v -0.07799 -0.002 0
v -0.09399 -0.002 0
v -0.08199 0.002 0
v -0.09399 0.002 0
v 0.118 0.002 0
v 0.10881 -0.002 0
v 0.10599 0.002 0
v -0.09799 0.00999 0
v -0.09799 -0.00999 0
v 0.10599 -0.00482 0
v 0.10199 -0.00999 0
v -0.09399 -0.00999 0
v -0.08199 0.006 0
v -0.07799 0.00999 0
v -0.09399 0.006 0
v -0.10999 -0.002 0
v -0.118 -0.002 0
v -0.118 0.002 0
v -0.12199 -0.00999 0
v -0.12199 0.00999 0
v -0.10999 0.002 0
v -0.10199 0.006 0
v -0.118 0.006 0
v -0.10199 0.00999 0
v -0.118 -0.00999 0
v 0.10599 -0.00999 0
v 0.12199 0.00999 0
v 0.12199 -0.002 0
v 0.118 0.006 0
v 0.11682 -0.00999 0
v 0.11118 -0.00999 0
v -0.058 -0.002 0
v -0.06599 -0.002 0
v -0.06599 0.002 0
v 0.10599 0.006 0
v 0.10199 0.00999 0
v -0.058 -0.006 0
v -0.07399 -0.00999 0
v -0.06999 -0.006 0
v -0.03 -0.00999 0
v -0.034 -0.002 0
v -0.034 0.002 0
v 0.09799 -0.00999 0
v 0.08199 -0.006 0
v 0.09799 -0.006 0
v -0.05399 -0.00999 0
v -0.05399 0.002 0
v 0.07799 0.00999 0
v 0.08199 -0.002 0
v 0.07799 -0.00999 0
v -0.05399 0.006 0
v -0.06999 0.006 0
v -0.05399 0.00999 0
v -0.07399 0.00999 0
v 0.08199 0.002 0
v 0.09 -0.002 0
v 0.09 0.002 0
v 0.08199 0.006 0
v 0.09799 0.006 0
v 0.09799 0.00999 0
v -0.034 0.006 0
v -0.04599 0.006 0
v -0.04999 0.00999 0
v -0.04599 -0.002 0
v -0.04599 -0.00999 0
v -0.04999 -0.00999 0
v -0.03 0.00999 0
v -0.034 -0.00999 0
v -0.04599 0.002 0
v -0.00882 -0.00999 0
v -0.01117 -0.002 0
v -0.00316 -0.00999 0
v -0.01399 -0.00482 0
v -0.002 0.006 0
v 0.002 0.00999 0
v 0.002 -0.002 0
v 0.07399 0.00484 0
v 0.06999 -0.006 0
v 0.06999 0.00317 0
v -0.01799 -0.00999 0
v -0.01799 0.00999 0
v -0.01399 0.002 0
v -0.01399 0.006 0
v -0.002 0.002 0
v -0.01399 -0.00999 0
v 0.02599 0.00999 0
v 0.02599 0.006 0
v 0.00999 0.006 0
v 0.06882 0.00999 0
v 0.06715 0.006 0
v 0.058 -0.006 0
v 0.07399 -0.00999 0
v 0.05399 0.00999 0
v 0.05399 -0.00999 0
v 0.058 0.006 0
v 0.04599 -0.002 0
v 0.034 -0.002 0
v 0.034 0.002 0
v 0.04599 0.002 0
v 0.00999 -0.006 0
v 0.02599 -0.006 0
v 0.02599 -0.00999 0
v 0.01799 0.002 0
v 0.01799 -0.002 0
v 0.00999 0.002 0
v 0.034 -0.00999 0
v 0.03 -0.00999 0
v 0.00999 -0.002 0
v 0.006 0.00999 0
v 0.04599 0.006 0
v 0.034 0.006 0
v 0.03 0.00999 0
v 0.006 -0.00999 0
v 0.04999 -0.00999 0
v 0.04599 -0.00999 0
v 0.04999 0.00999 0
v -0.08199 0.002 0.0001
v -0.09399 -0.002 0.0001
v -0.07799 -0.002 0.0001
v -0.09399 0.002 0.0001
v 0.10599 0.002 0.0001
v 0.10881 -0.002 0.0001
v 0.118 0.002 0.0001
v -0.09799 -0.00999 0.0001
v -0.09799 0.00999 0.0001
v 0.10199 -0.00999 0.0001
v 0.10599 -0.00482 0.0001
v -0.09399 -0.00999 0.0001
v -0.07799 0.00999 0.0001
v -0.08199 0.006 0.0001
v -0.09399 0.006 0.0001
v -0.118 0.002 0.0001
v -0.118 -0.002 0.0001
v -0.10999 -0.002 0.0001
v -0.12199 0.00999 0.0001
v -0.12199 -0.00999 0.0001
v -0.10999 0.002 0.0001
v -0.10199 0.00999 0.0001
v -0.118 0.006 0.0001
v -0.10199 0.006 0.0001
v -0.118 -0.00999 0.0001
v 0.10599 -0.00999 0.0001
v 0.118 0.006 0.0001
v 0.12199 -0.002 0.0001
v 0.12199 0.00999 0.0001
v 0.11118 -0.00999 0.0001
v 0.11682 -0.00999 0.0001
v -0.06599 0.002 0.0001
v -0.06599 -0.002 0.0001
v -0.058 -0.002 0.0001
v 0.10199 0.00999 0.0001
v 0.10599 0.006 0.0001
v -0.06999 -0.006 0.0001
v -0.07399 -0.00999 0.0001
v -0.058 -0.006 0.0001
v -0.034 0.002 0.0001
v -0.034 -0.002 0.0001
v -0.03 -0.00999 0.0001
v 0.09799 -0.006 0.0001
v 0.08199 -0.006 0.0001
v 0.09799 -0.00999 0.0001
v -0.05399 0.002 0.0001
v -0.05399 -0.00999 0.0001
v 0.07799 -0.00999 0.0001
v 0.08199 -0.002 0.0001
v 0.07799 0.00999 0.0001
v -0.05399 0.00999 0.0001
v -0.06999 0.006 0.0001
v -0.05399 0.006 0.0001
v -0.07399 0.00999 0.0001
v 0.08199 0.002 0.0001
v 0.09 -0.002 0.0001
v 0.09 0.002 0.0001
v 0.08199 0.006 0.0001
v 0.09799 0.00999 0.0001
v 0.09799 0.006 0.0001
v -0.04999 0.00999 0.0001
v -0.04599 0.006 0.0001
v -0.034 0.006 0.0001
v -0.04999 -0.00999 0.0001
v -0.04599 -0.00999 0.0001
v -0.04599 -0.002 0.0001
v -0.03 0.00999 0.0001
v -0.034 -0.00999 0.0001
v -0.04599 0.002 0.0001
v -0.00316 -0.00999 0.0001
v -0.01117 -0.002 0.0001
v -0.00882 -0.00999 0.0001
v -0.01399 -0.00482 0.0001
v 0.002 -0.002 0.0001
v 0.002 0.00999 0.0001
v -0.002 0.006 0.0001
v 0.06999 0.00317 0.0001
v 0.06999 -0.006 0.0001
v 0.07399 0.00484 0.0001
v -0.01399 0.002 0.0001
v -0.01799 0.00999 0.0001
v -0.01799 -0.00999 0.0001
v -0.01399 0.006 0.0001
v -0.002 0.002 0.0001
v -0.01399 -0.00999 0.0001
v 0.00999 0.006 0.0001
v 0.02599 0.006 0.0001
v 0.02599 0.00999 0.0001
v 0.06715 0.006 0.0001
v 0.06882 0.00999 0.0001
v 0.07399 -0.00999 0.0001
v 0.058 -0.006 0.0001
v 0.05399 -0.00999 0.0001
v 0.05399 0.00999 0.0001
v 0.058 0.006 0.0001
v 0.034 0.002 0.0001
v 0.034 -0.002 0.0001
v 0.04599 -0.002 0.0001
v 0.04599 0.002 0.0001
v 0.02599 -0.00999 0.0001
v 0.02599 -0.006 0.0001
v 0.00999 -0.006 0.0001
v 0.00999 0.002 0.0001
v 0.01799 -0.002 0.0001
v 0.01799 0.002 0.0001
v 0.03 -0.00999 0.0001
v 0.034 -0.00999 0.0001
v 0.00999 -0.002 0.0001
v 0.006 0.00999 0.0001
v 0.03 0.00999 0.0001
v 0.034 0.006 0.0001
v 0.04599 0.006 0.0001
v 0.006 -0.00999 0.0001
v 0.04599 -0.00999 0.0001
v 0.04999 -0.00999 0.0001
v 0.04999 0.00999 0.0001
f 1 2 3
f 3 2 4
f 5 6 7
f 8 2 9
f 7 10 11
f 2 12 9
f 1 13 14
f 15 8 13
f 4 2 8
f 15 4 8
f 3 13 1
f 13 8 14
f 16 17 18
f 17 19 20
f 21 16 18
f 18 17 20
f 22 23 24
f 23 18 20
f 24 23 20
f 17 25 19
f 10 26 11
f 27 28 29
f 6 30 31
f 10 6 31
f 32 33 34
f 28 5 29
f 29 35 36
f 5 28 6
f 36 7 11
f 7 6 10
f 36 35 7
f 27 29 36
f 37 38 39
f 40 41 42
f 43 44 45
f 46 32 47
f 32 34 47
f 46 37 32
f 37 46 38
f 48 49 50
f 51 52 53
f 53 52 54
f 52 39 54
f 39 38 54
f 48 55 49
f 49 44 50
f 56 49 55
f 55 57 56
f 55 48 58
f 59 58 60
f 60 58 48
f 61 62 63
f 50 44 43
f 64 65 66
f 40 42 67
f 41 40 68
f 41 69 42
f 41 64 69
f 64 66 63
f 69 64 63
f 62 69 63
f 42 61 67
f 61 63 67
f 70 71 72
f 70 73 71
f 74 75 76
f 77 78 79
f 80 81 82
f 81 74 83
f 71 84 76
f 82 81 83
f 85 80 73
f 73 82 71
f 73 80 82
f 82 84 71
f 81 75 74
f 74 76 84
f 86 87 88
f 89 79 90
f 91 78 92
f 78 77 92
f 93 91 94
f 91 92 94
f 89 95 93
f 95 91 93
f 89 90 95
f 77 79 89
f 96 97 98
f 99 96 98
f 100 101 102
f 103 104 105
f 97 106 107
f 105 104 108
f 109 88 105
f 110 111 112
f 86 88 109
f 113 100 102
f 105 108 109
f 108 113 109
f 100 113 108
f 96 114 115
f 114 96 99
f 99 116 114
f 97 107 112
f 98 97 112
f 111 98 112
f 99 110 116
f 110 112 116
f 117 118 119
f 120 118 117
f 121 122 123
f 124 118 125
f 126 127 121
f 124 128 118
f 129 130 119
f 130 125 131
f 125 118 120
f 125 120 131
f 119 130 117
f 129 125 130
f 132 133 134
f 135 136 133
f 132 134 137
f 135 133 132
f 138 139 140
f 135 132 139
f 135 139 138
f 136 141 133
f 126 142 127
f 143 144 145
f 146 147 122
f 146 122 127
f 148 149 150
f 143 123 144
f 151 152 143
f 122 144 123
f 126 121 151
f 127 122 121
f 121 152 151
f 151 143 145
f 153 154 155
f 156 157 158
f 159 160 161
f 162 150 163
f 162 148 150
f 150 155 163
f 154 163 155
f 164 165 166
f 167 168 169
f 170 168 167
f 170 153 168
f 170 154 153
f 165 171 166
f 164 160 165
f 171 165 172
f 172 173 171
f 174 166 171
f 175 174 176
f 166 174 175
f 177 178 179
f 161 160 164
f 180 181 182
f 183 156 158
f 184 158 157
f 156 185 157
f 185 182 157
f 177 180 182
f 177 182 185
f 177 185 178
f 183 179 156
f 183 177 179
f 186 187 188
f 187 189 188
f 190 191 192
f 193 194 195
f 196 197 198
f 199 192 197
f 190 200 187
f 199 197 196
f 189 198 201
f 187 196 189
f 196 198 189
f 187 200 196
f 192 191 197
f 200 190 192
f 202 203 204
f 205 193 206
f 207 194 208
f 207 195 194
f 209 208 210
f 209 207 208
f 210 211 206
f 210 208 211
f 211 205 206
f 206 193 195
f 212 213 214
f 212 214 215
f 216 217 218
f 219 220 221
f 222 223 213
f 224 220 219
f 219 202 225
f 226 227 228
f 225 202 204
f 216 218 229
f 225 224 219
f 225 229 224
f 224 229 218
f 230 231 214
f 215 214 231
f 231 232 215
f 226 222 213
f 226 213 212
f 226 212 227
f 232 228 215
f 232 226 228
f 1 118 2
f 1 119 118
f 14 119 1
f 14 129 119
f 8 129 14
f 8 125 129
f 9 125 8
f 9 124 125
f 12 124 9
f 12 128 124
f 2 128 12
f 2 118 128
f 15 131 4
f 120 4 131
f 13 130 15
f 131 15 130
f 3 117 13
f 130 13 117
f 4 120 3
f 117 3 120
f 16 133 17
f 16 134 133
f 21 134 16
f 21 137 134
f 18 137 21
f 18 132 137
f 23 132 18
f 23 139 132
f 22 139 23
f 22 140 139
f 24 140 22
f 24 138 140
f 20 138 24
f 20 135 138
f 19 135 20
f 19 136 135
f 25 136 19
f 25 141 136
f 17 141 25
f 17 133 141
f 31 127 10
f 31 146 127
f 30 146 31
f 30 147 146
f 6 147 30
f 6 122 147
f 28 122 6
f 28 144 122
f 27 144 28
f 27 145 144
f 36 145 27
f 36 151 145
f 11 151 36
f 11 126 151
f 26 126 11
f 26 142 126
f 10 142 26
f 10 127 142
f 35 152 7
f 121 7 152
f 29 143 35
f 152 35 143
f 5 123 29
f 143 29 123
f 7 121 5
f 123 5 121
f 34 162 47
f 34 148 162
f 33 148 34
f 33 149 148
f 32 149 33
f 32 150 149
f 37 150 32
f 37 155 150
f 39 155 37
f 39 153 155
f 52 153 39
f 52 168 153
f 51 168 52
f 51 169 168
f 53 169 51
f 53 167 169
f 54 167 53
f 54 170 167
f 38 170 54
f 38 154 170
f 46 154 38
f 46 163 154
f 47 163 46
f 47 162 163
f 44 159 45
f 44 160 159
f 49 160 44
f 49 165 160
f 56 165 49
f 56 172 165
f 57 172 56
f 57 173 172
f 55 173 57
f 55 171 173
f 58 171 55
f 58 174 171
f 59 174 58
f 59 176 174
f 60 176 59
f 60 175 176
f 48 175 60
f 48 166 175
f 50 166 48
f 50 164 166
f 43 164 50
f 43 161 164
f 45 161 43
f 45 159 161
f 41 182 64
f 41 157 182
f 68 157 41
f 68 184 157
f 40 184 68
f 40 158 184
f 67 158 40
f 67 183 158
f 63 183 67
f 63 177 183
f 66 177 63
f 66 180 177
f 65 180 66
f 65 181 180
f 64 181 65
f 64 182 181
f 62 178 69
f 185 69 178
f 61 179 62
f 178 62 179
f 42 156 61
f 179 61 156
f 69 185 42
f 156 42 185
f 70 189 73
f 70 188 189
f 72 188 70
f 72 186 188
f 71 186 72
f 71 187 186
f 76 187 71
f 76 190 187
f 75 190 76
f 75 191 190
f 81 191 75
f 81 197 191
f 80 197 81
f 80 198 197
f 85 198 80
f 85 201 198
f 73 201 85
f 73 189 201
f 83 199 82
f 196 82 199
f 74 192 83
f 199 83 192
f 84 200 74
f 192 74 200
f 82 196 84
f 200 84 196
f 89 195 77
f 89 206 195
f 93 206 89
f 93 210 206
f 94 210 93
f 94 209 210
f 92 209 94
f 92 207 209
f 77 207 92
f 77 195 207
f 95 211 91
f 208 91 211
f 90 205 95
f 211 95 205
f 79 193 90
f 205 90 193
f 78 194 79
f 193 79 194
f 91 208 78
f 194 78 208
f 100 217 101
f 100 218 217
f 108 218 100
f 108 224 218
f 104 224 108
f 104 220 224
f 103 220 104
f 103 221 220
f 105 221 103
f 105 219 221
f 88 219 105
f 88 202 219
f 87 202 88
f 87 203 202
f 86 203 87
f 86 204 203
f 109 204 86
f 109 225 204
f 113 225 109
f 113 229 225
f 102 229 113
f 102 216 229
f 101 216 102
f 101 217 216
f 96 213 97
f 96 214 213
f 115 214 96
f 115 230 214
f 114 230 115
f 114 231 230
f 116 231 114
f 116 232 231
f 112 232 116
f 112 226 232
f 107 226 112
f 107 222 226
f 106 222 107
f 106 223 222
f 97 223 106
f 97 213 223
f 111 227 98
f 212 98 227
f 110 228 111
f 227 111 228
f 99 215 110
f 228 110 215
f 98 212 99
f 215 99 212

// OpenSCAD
// file: Text_shared.scad
char_depth = 0.0001;

char_pixelsz = 0.02/5;
char_pheight = 5;
char_max_pwidth = 5;

function sum(list) = list * [for (_=list) 1];
function partialsum(list, end) = list * [for (i=[0:len(list)-1]) i < end ? 1 : 0];

module _Text_Line(a, b) {
  l = norm(b-a);
  f = l > 0 ? (b-a)/l : [1, 0];
  r = [f.y, -f.x];
  ea = -0.5*f;
  eb = (l+0.5)*f;
  sr = 0.5*r;
  sl = -sr;
  polygon([
    a+ea+sr,
    a+eb+sr,
    a+eb+sl,
    a+ea+sl,
  ]*char_pixelsz);
}

module _Text_Segments(pts, off=[0,0]) {
  for (i=[0:len(pts)-2]) {
    pa = pts[i];
    pb = pts[i+1];
    if (len(pa) == 2 && len(pb) == 2)
      _Text_Line(pts[i]+off, pts[i+1]+off);
  }
}

_Letters = [
  [[-2, -2], [-2, 2], [2, 2], [2, -2], [2, 0], [-2, 0]], // A
  [], // B
  [[2, -2], [-2, -2], [-2, 2], [2, 2]], // C
  [[2, 0.5], [2, -2], [-2, -2], [-2, 2], [0.5, 2], [], [3, 0], [0, 3]], // D
  [[2, -2], [-2, -2], [-2, 2], [2, 2], [], [-2, 0], [0, 0]], // E
  [[2, 2], [-2, 2], [-2, -2], [-2, 0], [0, 0]], // F
  [[0, 0], [2, 0], [2, -2], [-2, -2], [-2, 2], [2, 2]], // G
  [], // H
  [[0, -2], [0, 2]], // I
  [], // J
  [], // K
  [[-2, 2], [-2, -2], [2, -2]], // L
  [], // M
  [], // N
  [[-2, -2], [-2, 2], [2, 2], [2, -2], [-2, -2]], // O
  [[-2, -2], [-2, 2], [2, 2], [2, 0], [-2, 0]], // P
  [], // Q
  [[-2, -2], [-2, 2], [2, 2], [2, 0], [-2, 0], [1, -3]], // R
  [], // S
  [], // T
  [], // U
  [], // V
  [], // W
  [], // X
  [], // Y
  [], // Z
  [[-2, 2], [2, 2], [2, 0], [0, 0], [], [0, -2], [0, -2]], // ? for missing
];

function _Letter_Lookup(c) =
  let(
    ci=ord(c),
    li=ci-ord("A"),
    issp=ci==32,
    lps=li>=0&&li<26 ? _Letters[li] : [],
    lpf=len(lps)==0 ? _Letters[26] : lps
  ) issp ? [] : lpf;

function _Letter_Bounds(letter) =
  let(
    fletter = concat([[0, 0]], [for (l=letter) len(l)==2 ? l : [0,0]]),
    xs = [for (l=fletter) l.x],
    ys = [for (l=fletter) l.y]
  ) [min(xs), min(ys), max(xs), max(ys)];

module Text(letters) {
  lbounds = [for (l=letters) _Letter_Bounds(l)];
  lwidths = [for (b=lbounds) min(b.z-b.x+1, char_max_pwidth)];
  lmins = [for (b=lbounds) b.x];
  twid = sum(lwidths) + len(letters)-1;
  startoff = (1-twid)/2;
  offs = [for (i=[0:len(letters)-1]) startoff+i+partialsum(lwidths, i)];
  linear_extrude(height=char_depth) {
    for (i=[0:len(letters)-1]) if (len(letters[i]) > 0) {
      letter = letters[i];
      off = offs[i];
      left = off-lmins[i];
      wid = lwidths[i];
      intersection() {
        _Text_Segments(letter, [left, 0]);
        scale([char_pixelsz,char_pixelsz]) translate([off-0.5, -char_pheight/2])
          square(size=[wid, char_pheight]);
      }
    }
  }
}

module Text(text) {
  letters = [for (c=text) _Letter_Lookup(c)];
  lbounds = [for (l=letters) _Letter_Bounds(l)];
  lwidths = [for (b=lbounds) min(b.z-b.x+1, char_max_pwidth)];
  lmins = [for (b=lbounds) b.x];
  twid = sum(lwidths) + len(letters)-1;
  startoff = (1-twid)/2;
  offs = [for (i=[0:len(letters)-1]) startoff+i+partialsum(lwidths, i)];
  linear_extrude(height=char_depth) {
    for (i=[0:len(letters)-1]) if (len(letters[i]) > 0) {
      letter = letters[i];
      off = offs[i];
      left = off-lmins[i];
      wid = lwidths[i];
      intersection() {
        _Text_Segments(letter, [left, 0]);
        scale([char_pixelsz,char_pixelsz]) translate([off-0.5, -char_pheight/2])
          square(size=[wid, char_pheight]);
      }
    }
  }
}
// main file
include <Text_shared.scad>;

module Text_FPGAREADER() {
  Text("FPGA READER");
}

Text_FPGAREADER();
